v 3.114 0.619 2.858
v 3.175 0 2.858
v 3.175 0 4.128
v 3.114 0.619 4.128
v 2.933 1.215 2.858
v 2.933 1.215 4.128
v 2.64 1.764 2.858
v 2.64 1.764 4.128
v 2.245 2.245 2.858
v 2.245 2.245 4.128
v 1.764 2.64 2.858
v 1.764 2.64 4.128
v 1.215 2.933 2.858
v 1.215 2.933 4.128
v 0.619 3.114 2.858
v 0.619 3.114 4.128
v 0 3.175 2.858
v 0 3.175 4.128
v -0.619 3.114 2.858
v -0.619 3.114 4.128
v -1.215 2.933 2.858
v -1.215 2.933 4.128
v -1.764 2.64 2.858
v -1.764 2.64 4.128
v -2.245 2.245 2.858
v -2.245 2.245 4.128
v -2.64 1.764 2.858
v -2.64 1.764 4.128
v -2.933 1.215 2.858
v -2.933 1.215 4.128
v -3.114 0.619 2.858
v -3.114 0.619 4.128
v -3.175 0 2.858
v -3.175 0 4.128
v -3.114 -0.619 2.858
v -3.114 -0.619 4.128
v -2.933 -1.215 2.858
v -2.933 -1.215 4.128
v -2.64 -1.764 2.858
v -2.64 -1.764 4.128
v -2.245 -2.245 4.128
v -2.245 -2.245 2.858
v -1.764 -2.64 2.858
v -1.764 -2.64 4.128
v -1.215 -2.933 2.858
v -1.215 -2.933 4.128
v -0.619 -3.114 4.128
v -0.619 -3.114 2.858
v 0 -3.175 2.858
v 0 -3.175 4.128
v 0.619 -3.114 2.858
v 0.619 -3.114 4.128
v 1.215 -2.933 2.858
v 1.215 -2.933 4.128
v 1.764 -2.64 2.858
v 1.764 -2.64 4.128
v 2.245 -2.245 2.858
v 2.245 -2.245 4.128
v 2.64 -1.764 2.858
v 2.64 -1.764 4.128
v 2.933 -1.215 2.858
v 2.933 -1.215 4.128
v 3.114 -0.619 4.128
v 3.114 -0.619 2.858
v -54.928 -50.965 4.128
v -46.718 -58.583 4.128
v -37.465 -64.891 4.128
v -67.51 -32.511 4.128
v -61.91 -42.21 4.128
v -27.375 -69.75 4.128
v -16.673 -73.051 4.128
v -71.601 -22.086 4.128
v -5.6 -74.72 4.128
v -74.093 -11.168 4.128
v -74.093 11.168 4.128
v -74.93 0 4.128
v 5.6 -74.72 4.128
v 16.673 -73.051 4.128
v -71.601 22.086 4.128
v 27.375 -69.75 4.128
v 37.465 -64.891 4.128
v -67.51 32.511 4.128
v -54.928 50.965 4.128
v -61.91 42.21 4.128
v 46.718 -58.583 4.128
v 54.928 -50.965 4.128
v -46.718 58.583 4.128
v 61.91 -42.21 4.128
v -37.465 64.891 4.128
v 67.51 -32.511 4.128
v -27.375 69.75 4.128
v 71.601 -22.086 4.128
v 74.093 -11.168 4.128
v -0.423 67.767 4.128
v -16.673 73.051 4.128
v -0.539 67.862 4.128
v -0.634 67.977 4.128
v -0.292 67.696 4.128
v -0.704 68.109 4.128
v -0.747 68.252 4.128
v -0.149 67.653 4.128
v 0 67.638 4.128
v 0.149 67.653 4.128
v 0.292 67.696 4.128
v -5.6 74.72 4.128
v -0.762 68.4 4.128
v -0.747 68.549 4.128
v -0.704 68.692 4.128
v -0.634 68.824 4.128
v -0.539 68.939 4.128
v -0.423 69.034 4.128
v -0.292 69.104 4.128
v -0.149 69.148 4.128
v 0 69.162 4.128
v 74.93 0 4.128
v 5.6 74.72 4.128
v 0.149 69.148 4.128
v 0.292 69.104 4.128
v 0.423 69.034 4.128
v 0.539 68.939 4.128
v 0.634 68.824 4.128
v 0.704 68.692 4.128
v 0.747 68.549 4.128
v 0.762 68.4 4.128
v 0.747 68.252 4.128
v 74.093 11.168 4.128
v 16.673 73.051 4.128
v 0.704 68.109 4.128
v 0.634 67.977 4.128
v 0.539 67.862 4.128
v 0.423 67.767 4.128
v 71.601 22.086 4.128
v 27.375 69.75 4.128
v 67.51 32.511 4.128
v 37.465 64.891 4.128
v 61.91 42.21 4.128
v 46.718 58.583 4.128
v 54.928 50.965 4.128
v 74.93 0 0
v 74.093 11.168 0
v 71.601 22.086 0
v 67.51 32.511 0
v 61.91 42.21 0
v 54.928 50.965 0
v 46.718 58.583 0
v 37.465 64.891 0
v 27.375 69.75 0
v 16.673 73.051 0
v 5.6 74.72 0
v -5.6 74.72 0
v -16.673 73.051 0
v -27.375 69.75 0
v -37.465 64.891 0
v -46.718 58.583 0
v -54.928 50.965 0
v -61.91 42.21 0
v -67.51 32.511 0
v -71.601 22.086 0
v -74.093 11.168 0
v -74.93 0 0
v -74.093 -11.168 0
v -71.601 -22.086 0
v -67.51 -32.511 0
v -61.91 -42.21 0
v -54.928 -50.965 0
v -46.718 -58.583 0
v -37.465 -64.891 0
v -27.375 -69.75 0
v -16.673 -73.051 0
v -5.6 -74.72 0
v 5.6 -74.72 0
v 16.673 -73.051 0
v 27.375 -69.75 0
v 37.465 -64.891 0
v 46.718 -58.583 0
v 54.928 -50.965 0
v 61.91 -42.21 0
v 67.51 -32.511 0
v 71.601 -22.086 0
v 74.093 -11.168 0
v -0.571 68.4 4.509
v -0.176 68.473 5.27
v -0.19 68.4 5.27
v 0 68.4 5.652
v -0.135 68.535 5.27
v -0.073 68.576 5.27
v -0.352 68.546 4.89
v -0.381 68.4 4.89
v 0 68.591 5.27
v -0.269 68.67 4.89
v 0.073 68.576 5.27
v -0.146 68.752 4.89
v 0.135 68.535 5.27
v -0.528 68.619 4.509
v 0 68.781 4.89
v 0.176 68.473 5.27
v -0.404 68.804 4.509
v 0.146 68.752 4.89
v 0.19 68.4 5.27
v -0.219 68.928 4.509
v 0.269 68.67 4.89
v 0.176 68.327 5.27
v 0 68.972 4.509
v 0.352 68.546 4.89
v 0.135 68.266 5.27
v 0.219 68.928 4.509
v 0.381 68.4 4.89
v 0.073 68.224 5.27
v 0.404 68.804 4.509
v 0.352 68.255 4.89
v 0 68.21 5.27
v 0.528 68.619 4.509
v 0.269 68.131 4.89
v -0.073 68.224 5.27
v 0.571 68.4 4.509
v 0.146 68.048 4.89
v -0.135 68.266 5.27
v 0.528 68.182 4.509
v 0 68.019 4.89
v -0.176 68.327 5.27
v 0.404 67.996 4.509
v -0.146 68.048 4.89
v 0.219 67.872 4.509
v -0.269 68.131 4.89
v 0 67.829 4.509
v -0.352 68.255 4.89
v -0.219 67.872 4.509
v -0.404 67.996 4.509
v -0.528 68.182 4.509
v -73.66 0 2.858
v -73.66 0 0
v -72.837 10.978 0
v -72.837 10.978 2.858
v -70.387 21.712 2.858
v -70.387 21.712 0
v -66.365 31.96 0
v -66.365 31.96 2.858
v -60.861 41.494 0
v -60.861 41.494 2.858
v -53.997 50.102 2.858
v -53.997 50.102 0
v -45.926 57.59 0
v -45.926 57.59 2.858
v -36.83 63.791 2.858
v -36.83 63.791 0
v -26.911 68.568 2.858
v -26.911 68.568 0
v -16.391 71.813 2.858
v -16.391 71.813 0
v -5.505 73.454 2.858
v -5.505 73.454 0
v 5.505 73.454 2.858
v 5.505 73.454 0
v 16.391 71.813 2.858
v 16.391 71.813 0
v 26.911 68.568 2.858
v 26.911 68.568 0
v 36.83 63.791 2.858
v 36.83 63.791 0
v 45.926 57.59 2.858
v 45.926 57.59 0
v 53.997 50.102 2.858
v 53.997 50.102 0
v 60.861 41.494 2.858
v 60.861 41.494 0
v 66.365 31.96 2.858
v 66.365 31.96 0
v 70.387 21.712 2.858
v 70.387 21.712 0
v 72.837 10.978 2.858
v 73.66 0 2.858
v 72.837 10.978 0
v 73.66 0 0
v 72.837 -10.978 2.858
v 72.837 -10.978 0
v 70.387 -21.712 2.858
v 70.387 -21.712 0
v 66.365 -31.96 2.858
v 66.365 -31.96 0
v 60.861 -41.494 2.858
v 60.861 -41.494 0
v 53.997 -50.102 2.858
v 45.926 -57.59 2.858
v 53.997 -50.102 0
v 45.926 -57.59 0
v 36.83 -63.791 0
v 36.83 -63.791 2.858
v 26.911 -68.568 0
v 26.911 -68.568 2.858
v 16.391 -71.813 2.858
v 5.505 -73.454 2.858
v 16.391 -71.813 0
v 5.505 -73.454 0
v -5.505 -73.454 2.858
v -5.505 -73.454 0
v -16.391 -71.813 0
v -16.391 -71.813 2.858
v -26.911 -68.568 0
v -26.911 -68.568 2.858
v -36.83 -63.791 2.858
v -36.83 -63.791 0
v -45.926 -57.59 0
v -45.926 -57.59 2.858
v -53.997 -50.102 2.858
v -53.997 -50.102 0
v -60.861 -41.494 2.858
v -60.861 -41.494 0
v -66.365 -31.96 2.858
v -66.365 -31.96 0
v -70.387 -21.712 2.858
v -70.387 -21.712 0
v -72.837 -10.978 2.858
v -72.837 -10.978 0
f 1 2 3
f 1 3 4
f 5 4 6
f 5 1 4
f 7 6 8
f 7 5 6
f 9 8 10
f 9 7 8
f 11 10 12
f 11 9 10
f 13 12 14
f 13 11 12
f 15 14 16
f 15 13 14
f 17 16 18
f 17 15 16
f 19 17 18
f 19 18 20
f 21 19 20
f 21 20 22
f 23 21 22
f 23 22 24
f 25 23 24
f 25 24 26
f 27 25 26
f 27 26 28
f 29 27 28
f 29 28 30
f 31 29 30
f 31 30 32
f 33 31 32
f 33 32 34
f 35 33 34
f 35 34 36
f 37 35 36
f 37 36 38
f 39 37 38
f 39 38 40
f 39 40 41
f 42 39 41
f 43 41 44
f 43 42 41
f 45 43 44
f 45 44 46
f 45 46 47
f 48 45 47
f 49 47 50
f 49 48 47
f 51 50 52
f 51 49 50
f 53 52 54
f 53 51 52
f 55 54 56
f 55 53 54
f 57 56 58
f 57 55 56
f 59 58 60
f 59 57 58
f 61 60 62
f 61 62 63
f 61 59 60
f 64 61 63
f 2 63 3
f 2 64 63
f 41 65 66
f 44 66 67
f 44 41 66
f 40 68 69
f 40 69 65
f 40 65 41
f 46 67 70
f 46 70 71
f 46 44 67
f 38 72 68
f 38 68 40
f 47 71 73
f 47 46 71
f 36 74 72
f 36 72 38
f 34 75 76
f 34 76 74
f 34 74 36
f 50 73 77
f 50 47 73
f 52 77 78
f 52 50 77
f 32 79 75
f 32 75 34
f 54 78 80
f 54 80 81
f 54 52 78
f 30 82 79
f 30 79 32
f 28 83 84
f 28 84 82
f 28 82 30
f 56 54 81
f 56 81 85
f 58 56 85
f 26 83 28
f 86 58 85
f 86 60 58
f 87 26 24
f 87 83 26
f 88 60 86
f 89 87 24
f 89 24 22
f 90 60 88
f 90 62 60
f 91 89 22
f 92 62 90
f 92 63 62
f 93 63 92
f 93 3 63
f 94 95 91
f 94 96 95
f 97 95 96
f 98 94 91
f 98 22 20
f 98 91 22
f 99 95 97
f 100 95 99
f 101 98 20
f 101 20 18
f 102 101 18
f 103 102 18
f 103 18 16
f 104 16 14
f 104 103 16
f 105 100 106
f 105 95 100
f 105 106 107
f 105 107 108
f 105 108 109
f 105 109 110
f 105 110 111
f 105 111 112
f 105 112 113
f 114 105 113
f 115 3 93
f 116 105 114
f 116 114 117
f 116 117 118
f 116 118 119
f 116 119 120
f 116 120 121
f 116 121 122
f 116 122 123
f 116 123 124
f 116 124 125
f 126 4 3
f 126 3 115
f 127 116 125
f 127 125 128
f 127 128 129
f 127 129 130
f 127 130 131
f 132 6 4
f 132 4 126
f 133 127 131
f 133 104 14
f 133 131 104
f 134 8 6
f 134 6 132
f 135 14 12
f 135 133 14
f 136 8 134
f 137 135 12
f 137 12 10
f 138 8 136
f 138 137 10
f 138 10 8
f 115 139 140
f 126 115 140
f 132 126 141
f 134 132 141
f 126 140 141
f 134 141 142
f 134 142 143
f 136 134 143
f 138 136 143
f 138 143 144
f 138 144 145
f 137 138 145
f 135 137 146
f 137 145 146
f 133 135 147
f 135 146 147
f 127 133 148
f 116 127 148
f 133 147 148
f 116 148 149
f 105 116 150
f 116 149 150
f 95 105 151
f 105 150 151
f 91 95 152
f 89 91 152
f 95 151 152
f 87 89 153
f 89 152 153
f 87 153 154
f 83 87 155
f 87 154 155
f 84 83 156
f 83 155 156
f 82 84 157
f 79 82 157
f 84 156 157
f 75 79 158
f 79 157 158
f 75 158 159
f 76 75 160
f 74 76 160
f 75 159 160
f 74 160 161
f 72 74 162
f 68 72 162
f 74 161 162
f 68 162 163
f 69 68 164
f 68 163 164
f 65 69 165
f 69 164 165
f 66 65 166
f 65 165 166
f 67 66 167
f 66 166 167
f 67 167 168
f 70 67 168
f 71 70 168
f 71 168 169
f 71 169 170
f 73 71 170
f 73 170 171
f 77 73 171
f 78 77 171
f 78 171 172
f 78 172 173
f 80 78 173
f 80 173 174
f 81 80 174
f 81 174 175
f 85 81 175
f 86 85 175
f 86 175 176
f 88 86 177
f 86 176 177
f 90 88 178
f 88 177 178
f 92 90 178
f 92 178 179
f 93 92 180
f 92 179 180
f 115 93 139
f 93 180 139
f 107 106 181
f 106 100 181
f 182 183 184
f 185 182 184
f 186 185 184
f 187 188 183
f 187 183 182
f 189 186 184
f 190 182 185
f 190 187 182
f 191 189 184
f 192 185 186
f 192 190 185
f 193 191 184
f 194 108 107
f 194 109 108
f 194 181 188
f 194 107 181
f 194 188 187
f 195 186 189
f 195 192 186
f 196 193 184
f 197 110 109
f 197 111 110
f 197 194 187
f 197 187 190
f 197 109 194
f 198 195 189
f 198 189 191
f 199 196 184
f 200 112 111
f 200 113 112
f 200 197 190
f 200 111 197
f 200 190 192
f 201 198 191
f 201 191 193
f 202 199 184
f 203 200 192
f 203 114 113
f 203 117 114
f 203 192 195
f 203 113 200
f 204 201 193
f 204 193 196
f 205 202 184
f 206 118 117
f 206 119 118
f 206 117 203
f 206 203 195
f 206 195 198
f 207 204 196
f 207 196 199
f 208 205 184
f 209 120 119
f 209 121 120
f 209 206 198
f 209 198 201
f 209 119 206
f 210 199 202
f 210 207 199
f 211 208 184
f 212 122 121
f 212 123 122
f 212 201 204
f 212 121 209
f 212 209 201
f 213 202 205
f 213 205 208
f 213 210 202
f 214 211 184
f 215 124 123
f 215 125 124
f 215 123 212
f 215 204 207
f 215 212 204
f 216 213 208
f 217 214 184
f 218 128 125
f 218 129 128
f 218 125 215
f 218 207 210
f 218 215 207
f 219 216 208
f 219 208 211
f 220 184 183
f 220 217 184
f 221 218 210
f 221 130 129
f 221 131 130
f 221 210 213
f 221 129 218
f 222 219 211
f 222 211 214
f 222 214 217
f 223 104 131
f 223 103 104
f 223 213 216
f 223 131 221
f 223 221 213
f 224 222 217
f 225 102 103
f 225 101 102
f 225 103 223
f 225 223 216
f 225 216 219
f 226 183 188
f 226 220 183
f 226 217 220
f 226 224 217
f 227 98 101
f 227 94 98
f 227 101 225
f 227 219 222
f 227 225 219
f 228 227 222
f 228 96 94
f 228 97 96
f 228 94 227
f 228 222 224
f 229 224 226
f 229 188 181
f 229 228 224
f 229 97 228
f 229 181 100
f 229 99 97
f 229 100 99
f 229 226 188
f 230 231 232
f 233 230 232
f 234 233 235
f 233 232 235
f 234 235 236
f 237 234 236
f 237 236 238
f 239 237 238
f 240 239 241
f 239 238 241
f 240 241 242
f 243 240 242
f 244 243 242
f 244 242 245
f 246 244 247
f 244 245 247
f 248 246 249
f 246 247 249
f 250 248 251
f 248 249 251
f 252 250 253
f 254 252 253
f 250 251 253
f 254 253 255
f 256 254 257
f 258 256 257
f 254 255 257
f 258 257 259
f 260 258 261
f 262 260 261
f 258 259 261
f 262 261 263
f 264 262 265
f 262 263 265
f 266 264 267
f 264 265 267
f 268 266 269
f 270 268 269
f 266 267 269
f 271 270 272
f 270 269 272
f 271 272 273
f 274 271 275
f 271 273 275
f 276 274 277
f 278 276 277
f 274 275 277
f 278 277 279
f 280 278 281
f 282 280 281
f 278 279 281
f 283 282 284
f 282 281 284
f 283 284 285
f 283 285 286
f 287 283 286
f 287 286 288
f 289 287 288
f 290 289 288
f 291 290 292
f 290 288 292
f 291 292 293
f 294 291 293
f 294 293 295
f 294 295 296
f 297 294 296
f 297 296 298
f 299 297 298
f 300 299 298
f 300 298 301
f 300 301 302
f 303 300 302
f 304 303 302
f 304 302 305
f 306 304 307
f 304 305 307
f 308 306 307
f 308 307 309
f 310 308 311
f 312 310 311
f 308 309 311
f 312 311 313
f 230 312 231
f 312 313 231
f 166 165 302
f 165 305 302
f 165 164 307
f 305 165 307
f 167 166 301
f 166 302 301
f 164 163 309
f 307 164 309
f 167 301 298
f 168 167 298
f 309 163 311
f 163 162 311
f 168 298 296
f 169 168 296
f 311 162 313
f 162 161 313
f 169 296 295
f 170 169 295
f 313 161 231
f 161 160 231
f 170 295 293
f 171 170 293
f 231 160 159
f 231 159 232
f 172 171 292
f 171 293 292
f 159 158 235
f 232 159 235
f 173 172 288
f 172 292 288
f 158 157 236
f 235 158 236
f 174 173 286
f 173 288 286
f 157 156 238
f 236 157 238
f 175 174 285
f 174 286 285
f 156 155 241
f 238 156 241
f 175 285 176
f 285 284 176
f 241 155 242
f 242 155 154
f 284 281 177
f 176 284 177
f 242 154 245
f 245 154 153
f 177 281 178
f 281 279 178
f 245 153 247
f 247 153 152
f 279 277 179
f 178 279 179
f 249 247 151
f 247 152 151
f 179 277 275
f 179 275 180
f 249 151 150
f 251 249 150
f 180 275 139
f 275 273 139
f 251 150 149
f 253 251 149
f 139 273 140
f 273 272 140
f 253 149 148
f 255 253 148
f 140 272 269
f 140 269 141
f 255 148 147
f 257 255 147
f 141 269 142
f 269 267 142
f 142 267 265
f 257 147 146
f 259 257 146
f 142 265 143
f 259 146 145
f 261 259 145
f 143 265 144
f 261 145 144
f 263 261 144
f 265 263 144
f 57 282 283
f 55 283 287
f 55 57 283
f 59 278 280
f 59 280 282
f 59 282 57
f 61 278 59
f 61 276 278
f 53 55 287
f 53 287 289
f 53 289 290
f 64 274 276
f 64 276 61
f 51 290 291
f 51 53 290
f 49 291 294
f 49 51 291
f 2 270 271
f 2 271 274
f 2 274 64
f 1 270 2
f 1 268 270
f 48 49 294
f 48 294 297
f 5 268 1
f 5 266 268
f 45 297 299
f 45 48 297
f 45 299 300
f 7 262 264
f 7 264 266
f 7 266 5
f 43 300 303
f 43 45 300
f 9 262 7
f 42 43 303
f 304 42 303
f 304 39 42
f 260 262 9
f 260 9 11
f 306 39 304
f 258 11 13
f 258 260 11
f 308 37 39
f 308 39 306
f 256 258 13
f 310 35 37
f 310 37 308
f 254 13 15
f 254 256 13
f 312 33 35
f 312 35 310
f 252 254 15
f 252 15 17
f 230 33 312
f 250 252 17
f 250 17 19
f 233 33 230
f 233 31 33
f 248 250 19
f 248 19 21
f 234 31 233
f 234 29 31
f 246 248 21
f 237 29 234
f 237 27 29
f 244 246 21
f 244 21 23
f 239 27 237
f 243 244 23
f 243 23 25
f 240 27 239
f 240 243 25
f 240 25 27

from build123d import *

# Parameters (mm, degrees)
SKETCH1_R           = 74.93
SKETCH1_R_2         = 3.175
BOSS_EXTRUDE1_DEPTH = 4.1275
SKETCH2_R           = 73.66
CUT_EXTRUDE1_DEPTH  = 2.8575


with BuildPart() as part:
    # Sketch1 → Boss-Extrude1 (new body)
    with BuildSketch(Plane.XY):
        Circle(SKETCH1_R)
        Circle(SKETCH1_R_2, mode=Mode.SUBTRACT)
    extrude(amount=BOSS_EXTRUDE1_DEPTH)

    # Sketch2 → Cut-Extrude1 (cut)
    with BuildSketch(Plane(origin=(0, 0, 0), x_dir=(-1, 0, 0), z_dir=(0, 0, -1))):
        Circle(SKETCH2_R)
    extrude(amount=-CUT_EXTRUDE1_DEPTH, mode=Mode.SUBTRACT)

    # Sketch3 → Revolve1 (revolve)
    with BuildSketch(Plane(origin=(0, 0, 0), x_dir=(0, 0, -1), z_dir=(1, 0, 0)), mode=Mode.PRIVATE) as revolve1_sk:
        Polygon((-5.6515, 68.400374819), (-4.1275, 69.162374819), (-4.1275, 68.400374819), align=None)
    revolve(revolve1_sk.sketch.rotate(Axis((0, 68.400374819, 5.6515), (0, 0, -1)), 270), axis=Axis((0, 68.400374819, 5.6515), (0, 0, -1)))


solid = part.part
